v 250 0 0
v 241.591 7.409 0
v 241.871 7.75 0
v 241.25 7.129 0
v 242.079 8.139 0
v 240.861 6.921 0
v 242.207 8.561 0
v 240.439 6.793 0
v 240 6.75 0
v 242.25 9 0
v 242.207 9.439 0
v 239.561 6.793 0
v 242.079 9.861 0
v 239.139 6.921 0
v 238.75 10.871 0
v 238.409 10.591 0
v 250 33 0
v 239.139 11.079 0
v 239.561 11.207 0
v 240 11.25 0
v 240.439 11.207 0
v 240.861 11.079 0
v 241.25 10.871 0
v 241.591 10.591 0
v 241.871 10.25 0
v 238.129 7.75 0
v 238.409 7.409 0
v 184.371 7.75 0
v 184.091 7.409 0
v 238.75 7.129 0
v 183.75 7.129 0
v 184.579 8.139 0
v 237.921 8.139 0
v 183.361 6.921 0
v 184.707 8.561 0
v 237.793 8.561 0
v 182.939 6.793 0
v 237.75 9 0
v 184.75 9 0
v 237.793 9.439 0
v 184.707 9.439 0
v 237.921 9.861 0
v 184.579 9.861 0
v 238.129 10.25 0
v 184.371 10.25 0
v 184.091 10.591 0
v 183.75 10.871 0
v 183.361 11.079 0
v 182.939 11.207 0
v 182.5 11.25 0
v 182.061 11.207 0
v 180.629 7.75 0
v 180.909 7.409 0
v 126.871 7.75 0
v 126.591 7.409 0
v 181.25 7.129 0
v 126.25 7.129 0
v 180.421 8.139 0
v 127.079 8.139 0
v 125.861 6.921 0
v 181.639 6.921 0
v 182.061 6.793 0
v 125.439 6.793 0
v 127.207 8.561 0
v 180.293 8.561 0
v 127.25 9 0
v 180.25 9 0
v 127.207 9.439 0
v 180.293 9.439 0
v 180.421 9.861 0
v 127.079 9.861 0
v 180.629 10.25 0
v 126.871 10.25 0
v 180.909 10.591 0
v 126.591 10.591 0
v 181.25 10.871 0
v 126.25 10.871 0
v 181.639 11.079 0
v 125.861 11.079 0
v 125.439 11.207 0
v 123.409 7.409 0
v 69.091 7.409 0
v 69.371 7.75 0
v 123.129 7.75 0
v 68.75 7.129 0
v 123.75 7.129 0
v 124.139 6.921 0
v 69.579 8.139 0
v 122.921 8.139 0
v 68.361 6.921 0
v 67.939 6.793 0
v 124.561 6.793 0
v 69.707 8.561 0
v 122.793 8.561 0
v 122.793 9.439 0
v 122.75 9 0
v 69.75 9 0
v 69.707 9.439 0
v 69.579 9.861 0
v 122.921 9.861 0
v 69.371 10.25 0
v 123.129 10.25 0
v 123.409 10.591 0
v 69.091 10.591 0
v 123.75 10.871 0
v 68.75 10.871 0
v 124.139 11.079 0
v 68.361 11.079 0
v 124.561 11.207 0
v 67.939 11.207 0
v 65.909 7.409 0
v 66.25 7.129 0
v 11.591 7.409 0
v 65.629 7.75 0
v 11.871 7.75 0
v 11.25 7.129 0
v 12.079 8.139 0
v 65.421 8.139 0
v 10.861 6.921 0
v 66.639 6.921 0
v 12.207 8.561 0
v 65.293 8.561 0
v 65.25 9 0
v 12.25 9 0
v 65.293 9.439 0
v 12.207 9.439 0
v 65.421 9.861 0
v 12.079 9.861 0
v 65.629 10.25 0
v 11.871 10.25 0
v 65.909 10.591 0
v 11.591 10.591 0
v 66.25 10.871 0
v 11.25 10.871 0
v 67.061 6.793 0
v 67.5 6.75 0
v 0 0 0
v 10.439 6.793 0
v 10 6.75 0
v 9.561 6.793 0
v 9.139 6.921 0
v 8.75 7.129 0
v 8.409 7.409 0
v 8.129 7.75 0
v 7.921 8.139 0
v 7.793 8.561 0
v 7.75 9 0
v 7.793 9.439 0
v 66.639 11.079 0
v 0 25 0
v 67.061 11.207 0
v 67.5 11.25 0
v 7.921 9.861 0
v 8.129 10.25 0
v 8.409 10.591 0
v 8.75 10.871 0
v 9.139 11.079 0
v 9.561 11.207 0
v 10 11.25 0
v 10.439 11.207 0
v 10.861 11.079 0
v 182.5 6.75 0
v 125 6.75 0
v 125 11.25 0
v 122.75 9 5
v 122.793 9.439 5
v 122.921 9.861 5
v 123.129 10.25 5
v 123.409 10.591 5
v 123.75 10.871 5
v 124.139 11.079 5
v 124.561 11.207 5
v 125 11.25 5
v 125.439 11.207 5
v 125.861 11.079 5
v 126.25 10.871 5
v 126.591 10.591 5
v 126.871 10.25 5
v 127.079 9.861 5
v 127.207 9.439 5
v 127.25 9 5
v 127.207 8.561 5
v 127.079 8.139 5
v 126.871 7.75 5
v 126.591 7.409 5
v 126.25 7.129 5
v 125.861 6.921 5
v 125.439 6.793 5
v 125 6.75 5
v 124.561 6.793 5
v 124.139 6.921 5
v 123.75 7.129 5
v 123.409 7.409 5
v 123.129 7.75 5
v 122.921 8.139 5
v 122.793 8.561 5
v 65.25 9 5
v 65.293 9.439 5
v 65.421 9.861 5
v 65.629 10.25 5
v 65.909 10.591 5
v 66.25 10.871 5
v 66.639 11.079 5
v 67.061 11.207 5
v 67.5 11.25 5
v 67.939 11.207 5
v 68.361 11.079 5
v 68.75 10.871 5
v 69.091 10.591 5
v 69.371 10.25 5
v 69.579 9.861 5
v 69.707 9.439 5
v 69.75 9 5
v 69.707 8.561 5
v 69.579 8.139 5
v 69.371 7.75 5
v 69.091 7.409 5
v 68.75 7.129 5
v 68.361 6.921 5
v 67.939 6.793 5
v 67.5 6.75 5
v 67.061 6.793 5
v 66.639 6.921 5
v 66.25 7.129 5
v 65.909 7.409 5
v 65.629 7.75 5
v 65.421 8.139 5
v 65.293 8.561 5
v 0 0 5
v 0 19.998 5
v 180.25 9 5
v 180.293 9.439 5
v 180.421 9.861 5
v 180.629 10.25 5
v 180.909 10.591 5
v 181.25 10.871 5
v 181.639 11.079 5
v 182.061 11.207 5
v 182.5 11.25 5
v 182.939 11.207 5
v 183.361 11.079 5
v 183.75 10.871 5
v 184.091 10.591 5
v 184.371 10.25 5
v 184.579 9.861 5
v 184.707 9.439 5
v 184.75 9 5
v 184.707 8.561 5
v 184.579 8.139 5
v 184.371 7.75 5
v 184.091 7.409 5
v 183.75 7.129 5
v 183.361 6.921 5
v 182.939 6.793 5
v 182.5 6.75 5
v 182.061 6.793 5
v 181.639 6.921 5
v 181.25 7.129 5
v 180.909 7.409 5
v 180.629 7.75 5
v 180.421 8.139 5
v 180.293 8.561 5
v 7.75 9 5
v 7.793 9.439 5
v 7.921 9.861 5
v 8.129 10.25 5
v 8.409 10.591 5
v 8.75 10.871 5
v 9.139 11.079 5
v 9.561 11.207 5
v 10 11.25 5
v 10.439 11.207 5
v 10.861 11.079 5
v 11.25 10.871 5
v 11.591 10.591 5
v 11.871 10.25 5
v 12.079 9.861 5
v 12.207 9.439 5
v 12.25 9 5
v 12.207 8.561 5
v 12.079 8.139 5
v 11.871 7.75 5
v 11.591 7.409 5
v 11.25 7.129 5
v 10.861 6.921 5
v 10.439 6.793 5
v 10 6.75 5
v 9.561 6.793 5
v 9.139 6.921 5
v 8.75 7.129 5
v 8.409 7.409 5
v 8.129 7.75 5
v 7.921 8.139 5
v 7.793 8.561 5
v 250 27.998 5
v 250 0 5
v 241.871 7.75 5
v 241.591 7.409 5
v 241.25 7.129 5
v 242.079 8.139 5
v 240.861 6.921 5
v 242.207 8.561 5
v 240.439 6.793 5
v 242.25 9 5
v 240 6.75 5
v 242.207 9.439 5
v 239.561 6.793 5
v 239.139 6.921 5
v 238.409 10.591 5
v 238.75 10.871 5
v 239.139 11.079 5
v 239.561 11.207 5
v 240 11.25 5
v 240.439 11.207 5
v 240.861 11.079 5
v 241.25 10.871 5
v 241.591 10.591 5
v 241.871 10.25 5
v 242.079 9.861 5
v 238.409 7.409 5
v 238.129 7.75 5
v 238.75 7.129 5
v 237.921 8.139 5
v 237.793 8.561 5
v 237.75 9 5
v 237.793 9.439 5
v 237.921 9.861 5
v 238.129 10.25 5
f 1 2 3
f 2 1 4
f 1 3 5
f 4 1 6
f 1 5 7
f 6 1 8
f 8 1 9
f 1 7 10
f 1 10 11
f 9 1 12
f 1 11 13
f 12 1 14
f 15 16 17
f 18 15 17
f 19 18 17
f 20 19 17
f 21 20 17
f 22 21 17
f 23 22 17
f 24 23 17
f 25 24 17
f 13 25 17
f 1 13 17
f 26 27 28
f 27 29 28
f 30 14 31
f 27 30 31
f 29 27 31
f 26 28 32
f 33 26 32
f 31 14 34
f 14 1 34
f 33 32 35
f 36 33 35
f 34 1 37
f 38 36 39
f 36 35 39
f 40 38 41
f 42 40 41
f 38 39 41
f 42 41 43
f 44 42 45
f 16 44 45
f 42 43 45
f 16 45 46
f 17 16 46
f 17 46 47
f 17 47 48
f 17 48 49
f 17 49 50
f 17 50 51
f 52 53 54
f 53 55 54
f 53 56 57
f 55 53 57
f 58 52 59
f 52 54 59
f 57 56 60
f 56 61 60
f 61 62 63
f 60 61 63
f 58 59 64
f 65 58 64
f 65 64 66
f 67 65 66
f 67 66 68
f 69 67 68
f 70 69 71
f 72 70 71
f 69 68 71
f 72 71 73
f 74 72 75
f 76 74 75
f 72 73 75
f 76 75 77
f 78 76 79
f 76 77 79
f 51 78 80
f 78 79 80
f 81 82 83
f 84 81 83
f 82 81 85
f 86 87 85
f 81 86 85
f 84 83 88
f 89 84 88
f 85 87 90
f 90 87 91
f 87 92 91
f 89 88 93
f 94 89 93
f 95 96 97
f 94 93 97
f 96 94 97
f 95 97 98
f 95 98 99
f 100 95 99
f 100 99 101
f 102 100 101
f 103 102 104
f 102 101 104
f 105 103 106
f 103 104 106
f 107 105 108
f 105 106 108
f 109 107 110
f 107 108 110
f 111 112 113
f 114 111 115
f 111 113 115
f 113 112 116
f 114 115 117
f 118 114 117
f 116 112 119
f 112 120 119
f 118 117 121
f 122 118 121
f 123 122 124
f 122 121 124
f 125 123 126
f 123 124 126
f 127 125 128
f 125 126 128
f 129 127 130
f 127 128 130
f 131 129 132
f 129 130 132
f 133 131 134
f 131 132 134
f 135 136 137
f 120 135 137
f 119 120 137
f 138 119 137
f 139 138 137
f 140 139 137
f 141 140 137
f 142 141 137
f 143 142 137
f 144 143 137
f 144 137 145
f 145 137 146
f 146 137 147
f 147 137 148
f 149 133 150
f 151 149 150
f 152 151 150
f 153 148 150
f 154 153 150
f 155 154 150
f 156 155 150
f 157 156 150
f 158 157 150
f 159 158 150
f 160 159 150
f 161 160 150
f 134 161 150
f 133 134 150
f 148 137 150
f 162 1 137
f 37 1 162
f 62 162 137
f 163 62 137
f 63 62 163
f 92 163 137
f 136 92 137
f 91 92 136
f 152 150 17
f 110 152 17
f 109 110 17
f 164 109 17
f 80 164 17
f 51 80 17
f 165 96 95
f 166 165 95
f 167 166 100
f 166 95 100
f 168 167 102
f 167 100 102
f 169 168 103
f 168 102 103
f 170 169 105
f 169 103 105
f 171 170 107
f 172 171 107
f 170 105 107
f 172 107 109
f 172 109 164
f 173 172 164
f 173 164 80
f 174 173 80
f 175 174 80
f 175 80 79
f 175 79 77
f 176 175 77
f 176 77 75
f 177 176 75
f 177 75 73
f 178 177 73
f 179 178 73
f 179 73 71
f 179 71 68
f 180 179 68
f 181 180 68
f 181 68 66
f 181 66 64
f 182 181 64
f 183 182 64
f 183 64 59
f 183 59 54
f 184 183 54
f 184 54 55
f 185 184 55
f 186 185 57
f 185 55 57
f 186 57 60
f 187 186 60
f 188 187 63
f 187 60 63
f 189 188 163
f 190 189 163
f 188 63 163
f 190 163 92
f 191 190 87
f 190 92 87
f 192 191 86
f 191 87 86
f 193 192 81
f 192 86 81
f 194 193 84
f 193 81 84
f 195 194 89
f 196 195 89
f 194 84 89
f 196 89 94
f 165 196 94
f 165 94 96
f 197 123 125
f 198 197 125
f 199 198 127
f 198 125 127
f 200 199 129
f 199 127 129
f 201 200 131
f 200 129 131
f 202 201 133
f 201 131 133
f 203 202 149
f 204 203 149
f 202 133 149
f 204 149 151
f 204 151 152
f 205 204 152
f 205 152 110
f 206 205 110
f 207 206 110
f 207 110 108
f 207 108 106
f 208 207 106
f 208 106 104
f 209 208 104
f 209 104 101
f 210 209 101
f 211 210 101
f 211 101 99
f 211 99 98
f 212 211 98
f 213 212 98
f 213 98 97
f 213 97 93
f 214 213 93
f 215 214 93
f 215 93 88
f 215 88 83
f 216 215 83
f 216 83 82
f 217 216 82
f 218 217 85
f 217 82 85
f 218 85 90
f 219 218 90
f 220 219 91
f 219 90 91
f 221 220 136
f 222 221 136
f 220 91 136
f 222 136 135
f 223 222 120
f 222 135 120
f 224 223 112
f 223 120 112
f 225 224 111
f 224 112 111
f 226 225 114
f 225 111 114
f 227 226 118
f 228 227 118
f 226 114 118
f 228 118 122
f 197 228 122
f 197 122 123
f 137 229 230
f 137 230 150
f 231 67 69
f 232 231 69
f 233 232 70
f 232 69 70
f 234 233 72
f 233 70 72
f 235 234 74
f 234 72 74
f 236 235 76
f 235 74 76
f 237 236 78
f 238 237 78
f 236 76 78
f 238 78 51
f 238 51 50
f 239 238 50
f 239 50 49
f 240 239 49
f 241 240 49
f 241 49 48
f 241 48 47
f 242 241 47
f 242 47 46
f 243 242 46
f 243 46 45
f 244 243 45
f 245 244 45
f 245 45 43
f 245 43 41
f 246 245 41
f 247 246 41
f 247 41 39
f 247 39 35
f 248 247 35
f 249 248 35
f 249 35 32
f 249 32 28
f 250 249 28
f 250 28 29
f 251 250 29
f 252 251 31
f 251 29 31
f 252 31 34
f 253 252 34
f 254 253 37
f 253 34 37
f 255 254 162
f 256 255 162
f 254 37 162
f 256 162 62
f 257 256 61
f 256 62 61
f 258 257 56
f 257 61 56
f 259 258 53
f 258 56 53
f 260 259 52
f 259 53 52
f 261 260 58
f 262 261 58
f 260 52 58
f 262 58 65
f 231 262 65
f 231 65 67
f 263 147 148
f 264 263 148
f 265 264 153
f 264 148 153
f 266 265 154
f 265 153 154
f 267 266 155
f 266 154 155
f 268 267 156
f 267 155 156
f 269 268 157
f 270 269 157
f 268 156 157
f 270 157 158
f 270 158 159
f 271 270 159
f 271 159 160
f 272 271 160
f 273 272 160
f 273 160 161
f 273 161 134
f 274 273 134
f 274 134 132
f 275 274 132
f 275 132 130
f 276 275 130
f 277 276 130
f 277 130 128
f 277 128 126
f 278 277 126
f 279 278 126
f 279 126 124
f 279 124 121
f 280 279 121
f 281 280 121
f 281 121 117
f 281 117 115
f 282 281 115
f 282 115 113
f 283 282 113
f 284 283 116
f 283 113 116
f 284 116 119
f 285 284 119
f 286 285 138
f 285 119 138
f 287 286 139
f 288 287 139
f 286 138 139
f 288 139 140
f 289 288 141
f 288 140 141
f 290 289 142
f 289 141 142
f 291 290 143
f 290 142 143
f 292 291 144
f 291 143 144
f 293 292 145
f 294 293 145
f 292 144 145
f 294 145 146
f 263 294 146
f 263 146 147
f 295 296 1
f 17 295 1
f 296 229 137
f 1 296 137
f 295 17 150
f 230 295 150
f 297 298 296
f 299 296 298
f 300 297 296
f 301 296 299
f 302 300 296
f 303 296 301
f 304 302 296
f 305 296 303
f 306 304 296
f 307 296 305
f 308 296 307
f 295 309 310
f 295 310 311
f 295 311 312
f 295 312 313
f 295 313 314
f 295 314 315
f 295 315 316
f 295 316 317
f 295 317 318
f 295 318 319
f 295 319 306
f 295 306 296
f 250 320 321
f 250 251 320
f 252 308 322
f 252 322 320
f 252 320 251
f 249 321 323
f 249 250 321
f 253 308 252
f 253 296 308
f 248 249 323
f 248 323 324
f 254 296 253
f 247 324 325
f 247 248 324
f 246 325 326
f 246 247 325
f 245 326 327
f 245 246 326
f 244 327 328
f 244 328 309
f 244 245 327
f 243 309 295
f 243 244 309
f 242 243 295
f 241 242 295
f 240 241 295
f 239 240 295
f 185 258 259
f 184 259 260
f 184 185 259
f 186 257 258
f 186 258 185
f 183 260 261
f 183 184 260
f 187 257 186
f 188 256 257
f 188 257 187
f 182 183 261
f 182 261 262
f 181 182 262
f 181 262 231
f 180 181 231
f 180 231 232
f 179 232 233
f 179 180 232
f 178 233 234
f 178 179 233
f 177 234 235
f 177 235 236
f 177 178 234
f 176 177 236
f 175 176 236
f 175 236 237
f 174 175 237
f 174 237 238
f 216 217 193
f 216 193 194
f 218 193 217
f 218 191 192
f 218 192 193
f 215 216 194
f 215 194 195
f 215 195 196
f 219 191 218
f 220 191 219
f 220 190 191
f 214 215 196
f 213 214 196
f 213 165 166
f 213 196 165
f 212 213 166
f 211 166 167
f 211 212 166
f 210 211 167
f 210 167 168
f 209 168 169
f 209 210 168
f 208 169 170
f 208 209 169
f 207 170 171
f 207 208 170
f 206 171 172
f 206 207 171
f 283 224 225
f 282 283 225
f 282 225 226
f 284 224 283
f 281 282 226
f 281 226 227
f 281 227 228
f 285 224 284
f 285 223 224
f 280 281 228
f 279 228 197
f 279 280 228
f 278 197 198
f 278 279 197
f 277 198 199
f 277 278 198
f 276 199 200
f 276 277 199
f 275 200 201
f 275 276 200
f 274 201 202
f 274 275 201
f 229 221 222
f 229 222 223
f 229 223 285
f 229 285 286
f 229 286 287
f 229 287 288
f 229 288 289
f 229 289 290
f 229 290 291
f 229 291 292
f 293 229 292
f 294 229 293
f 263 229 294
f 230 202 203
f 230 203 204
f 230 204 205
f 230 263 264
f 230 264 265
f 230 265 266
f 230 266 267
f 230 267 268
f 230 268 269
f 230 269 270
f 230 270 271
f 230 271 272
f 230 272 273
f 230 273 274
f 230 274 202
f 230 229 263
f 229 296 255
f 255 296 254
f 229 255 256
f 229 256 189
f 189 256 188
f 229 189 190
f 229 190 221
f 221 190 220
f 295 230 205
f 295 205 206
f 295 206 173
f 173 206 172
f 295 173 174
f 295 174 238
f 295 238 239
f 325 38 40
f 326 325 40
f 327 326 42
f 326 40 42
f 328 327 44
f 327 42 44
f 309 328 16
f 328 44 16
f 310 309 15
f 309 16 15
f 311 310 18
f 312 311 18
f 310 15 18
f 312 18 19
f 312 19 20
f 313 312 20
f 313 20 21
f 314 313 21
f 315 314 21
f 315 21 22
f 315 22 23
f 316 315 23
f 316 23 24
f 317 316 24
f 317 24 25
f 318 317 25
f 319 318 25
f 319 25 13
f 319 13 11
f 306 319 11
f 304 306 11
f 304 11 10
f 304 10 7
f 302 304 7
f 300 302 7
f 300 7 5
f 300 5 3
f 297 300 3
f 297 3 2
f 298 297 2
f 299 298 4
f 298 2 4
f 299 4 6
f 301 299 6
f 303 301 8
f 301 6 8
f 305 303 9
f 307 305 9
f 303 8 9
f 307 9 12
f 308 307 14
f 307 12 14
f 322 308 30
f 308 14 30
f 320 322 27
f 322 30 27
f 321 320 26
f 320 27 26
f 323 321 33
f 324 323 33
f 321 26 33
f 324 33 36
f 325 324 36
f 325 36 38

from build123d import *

# Parameters (mm, degrees)
SKETCH1_W            = 5
SKETCH1_H            = 33
BOSS_EXTRUDE1_DEPTH  = 250
CUT_EXTRUDE1_DEPTH   = 253.218159537
CHAMFER1_SIZE        = 5
M4_CLEARANCE_HOLE1_D = 4.5
LPATTERN1_COUNT      = 5
LPATTERN1_PITCH      = 57.5


with BuildPart() as part:
    # Sketch1 → Boss-Extrude1 (new body)
    with BuildSketch(Plane(origin=(0, 0, 0), x_dir=(0, 0, -1), z_dir=(1, 0, 0))):
        with Locations((-2.5, 16.5)):
            Rectangle(SKETCH1_W, SKETCH1_H)
    extrude(amount=BOSS_EXTRUDE1_DEPTH)

    # Sketch2 → Cut-Extrude1 (cut, through all)
    with BuildSketch(Plane.XY):
        Polygon((0, 33), (0, 25), (250, 33), align=None)
    extrude(amount=CUT_EXTRUDE1_DEPTH, mode=Mode.SUBTRACT)

    # Chamfer1
    chamfer1_edges = [part.edges().sort_by_distance(p)[0] for p in [
        (125, 29, 5),
    ]]
    chamfer(chamfer1_edges, length=CHAMFER1_SIZE - 0.0001)  # a hair under: the kernel refuses the full size

    # M4 Clearance Hole1 (through all)
    with Locations(Plane.XY.offset(5)):
        with Locations((240, 9)):
            m4_clearance_hole1 = Hole(M4_CLEARANCE_HOLE1_D / 2)

    # LPattern1: M4 Clearance Hole1 ×5
    with Locations(*[(-i * LPATTERN1_PITCH, 0, 0) for i in range(1, LPATTERN1_COUNT)]):
        add(m4_clearance_hole1, mode=Mode.SUBTRACT)


solid = part.part
